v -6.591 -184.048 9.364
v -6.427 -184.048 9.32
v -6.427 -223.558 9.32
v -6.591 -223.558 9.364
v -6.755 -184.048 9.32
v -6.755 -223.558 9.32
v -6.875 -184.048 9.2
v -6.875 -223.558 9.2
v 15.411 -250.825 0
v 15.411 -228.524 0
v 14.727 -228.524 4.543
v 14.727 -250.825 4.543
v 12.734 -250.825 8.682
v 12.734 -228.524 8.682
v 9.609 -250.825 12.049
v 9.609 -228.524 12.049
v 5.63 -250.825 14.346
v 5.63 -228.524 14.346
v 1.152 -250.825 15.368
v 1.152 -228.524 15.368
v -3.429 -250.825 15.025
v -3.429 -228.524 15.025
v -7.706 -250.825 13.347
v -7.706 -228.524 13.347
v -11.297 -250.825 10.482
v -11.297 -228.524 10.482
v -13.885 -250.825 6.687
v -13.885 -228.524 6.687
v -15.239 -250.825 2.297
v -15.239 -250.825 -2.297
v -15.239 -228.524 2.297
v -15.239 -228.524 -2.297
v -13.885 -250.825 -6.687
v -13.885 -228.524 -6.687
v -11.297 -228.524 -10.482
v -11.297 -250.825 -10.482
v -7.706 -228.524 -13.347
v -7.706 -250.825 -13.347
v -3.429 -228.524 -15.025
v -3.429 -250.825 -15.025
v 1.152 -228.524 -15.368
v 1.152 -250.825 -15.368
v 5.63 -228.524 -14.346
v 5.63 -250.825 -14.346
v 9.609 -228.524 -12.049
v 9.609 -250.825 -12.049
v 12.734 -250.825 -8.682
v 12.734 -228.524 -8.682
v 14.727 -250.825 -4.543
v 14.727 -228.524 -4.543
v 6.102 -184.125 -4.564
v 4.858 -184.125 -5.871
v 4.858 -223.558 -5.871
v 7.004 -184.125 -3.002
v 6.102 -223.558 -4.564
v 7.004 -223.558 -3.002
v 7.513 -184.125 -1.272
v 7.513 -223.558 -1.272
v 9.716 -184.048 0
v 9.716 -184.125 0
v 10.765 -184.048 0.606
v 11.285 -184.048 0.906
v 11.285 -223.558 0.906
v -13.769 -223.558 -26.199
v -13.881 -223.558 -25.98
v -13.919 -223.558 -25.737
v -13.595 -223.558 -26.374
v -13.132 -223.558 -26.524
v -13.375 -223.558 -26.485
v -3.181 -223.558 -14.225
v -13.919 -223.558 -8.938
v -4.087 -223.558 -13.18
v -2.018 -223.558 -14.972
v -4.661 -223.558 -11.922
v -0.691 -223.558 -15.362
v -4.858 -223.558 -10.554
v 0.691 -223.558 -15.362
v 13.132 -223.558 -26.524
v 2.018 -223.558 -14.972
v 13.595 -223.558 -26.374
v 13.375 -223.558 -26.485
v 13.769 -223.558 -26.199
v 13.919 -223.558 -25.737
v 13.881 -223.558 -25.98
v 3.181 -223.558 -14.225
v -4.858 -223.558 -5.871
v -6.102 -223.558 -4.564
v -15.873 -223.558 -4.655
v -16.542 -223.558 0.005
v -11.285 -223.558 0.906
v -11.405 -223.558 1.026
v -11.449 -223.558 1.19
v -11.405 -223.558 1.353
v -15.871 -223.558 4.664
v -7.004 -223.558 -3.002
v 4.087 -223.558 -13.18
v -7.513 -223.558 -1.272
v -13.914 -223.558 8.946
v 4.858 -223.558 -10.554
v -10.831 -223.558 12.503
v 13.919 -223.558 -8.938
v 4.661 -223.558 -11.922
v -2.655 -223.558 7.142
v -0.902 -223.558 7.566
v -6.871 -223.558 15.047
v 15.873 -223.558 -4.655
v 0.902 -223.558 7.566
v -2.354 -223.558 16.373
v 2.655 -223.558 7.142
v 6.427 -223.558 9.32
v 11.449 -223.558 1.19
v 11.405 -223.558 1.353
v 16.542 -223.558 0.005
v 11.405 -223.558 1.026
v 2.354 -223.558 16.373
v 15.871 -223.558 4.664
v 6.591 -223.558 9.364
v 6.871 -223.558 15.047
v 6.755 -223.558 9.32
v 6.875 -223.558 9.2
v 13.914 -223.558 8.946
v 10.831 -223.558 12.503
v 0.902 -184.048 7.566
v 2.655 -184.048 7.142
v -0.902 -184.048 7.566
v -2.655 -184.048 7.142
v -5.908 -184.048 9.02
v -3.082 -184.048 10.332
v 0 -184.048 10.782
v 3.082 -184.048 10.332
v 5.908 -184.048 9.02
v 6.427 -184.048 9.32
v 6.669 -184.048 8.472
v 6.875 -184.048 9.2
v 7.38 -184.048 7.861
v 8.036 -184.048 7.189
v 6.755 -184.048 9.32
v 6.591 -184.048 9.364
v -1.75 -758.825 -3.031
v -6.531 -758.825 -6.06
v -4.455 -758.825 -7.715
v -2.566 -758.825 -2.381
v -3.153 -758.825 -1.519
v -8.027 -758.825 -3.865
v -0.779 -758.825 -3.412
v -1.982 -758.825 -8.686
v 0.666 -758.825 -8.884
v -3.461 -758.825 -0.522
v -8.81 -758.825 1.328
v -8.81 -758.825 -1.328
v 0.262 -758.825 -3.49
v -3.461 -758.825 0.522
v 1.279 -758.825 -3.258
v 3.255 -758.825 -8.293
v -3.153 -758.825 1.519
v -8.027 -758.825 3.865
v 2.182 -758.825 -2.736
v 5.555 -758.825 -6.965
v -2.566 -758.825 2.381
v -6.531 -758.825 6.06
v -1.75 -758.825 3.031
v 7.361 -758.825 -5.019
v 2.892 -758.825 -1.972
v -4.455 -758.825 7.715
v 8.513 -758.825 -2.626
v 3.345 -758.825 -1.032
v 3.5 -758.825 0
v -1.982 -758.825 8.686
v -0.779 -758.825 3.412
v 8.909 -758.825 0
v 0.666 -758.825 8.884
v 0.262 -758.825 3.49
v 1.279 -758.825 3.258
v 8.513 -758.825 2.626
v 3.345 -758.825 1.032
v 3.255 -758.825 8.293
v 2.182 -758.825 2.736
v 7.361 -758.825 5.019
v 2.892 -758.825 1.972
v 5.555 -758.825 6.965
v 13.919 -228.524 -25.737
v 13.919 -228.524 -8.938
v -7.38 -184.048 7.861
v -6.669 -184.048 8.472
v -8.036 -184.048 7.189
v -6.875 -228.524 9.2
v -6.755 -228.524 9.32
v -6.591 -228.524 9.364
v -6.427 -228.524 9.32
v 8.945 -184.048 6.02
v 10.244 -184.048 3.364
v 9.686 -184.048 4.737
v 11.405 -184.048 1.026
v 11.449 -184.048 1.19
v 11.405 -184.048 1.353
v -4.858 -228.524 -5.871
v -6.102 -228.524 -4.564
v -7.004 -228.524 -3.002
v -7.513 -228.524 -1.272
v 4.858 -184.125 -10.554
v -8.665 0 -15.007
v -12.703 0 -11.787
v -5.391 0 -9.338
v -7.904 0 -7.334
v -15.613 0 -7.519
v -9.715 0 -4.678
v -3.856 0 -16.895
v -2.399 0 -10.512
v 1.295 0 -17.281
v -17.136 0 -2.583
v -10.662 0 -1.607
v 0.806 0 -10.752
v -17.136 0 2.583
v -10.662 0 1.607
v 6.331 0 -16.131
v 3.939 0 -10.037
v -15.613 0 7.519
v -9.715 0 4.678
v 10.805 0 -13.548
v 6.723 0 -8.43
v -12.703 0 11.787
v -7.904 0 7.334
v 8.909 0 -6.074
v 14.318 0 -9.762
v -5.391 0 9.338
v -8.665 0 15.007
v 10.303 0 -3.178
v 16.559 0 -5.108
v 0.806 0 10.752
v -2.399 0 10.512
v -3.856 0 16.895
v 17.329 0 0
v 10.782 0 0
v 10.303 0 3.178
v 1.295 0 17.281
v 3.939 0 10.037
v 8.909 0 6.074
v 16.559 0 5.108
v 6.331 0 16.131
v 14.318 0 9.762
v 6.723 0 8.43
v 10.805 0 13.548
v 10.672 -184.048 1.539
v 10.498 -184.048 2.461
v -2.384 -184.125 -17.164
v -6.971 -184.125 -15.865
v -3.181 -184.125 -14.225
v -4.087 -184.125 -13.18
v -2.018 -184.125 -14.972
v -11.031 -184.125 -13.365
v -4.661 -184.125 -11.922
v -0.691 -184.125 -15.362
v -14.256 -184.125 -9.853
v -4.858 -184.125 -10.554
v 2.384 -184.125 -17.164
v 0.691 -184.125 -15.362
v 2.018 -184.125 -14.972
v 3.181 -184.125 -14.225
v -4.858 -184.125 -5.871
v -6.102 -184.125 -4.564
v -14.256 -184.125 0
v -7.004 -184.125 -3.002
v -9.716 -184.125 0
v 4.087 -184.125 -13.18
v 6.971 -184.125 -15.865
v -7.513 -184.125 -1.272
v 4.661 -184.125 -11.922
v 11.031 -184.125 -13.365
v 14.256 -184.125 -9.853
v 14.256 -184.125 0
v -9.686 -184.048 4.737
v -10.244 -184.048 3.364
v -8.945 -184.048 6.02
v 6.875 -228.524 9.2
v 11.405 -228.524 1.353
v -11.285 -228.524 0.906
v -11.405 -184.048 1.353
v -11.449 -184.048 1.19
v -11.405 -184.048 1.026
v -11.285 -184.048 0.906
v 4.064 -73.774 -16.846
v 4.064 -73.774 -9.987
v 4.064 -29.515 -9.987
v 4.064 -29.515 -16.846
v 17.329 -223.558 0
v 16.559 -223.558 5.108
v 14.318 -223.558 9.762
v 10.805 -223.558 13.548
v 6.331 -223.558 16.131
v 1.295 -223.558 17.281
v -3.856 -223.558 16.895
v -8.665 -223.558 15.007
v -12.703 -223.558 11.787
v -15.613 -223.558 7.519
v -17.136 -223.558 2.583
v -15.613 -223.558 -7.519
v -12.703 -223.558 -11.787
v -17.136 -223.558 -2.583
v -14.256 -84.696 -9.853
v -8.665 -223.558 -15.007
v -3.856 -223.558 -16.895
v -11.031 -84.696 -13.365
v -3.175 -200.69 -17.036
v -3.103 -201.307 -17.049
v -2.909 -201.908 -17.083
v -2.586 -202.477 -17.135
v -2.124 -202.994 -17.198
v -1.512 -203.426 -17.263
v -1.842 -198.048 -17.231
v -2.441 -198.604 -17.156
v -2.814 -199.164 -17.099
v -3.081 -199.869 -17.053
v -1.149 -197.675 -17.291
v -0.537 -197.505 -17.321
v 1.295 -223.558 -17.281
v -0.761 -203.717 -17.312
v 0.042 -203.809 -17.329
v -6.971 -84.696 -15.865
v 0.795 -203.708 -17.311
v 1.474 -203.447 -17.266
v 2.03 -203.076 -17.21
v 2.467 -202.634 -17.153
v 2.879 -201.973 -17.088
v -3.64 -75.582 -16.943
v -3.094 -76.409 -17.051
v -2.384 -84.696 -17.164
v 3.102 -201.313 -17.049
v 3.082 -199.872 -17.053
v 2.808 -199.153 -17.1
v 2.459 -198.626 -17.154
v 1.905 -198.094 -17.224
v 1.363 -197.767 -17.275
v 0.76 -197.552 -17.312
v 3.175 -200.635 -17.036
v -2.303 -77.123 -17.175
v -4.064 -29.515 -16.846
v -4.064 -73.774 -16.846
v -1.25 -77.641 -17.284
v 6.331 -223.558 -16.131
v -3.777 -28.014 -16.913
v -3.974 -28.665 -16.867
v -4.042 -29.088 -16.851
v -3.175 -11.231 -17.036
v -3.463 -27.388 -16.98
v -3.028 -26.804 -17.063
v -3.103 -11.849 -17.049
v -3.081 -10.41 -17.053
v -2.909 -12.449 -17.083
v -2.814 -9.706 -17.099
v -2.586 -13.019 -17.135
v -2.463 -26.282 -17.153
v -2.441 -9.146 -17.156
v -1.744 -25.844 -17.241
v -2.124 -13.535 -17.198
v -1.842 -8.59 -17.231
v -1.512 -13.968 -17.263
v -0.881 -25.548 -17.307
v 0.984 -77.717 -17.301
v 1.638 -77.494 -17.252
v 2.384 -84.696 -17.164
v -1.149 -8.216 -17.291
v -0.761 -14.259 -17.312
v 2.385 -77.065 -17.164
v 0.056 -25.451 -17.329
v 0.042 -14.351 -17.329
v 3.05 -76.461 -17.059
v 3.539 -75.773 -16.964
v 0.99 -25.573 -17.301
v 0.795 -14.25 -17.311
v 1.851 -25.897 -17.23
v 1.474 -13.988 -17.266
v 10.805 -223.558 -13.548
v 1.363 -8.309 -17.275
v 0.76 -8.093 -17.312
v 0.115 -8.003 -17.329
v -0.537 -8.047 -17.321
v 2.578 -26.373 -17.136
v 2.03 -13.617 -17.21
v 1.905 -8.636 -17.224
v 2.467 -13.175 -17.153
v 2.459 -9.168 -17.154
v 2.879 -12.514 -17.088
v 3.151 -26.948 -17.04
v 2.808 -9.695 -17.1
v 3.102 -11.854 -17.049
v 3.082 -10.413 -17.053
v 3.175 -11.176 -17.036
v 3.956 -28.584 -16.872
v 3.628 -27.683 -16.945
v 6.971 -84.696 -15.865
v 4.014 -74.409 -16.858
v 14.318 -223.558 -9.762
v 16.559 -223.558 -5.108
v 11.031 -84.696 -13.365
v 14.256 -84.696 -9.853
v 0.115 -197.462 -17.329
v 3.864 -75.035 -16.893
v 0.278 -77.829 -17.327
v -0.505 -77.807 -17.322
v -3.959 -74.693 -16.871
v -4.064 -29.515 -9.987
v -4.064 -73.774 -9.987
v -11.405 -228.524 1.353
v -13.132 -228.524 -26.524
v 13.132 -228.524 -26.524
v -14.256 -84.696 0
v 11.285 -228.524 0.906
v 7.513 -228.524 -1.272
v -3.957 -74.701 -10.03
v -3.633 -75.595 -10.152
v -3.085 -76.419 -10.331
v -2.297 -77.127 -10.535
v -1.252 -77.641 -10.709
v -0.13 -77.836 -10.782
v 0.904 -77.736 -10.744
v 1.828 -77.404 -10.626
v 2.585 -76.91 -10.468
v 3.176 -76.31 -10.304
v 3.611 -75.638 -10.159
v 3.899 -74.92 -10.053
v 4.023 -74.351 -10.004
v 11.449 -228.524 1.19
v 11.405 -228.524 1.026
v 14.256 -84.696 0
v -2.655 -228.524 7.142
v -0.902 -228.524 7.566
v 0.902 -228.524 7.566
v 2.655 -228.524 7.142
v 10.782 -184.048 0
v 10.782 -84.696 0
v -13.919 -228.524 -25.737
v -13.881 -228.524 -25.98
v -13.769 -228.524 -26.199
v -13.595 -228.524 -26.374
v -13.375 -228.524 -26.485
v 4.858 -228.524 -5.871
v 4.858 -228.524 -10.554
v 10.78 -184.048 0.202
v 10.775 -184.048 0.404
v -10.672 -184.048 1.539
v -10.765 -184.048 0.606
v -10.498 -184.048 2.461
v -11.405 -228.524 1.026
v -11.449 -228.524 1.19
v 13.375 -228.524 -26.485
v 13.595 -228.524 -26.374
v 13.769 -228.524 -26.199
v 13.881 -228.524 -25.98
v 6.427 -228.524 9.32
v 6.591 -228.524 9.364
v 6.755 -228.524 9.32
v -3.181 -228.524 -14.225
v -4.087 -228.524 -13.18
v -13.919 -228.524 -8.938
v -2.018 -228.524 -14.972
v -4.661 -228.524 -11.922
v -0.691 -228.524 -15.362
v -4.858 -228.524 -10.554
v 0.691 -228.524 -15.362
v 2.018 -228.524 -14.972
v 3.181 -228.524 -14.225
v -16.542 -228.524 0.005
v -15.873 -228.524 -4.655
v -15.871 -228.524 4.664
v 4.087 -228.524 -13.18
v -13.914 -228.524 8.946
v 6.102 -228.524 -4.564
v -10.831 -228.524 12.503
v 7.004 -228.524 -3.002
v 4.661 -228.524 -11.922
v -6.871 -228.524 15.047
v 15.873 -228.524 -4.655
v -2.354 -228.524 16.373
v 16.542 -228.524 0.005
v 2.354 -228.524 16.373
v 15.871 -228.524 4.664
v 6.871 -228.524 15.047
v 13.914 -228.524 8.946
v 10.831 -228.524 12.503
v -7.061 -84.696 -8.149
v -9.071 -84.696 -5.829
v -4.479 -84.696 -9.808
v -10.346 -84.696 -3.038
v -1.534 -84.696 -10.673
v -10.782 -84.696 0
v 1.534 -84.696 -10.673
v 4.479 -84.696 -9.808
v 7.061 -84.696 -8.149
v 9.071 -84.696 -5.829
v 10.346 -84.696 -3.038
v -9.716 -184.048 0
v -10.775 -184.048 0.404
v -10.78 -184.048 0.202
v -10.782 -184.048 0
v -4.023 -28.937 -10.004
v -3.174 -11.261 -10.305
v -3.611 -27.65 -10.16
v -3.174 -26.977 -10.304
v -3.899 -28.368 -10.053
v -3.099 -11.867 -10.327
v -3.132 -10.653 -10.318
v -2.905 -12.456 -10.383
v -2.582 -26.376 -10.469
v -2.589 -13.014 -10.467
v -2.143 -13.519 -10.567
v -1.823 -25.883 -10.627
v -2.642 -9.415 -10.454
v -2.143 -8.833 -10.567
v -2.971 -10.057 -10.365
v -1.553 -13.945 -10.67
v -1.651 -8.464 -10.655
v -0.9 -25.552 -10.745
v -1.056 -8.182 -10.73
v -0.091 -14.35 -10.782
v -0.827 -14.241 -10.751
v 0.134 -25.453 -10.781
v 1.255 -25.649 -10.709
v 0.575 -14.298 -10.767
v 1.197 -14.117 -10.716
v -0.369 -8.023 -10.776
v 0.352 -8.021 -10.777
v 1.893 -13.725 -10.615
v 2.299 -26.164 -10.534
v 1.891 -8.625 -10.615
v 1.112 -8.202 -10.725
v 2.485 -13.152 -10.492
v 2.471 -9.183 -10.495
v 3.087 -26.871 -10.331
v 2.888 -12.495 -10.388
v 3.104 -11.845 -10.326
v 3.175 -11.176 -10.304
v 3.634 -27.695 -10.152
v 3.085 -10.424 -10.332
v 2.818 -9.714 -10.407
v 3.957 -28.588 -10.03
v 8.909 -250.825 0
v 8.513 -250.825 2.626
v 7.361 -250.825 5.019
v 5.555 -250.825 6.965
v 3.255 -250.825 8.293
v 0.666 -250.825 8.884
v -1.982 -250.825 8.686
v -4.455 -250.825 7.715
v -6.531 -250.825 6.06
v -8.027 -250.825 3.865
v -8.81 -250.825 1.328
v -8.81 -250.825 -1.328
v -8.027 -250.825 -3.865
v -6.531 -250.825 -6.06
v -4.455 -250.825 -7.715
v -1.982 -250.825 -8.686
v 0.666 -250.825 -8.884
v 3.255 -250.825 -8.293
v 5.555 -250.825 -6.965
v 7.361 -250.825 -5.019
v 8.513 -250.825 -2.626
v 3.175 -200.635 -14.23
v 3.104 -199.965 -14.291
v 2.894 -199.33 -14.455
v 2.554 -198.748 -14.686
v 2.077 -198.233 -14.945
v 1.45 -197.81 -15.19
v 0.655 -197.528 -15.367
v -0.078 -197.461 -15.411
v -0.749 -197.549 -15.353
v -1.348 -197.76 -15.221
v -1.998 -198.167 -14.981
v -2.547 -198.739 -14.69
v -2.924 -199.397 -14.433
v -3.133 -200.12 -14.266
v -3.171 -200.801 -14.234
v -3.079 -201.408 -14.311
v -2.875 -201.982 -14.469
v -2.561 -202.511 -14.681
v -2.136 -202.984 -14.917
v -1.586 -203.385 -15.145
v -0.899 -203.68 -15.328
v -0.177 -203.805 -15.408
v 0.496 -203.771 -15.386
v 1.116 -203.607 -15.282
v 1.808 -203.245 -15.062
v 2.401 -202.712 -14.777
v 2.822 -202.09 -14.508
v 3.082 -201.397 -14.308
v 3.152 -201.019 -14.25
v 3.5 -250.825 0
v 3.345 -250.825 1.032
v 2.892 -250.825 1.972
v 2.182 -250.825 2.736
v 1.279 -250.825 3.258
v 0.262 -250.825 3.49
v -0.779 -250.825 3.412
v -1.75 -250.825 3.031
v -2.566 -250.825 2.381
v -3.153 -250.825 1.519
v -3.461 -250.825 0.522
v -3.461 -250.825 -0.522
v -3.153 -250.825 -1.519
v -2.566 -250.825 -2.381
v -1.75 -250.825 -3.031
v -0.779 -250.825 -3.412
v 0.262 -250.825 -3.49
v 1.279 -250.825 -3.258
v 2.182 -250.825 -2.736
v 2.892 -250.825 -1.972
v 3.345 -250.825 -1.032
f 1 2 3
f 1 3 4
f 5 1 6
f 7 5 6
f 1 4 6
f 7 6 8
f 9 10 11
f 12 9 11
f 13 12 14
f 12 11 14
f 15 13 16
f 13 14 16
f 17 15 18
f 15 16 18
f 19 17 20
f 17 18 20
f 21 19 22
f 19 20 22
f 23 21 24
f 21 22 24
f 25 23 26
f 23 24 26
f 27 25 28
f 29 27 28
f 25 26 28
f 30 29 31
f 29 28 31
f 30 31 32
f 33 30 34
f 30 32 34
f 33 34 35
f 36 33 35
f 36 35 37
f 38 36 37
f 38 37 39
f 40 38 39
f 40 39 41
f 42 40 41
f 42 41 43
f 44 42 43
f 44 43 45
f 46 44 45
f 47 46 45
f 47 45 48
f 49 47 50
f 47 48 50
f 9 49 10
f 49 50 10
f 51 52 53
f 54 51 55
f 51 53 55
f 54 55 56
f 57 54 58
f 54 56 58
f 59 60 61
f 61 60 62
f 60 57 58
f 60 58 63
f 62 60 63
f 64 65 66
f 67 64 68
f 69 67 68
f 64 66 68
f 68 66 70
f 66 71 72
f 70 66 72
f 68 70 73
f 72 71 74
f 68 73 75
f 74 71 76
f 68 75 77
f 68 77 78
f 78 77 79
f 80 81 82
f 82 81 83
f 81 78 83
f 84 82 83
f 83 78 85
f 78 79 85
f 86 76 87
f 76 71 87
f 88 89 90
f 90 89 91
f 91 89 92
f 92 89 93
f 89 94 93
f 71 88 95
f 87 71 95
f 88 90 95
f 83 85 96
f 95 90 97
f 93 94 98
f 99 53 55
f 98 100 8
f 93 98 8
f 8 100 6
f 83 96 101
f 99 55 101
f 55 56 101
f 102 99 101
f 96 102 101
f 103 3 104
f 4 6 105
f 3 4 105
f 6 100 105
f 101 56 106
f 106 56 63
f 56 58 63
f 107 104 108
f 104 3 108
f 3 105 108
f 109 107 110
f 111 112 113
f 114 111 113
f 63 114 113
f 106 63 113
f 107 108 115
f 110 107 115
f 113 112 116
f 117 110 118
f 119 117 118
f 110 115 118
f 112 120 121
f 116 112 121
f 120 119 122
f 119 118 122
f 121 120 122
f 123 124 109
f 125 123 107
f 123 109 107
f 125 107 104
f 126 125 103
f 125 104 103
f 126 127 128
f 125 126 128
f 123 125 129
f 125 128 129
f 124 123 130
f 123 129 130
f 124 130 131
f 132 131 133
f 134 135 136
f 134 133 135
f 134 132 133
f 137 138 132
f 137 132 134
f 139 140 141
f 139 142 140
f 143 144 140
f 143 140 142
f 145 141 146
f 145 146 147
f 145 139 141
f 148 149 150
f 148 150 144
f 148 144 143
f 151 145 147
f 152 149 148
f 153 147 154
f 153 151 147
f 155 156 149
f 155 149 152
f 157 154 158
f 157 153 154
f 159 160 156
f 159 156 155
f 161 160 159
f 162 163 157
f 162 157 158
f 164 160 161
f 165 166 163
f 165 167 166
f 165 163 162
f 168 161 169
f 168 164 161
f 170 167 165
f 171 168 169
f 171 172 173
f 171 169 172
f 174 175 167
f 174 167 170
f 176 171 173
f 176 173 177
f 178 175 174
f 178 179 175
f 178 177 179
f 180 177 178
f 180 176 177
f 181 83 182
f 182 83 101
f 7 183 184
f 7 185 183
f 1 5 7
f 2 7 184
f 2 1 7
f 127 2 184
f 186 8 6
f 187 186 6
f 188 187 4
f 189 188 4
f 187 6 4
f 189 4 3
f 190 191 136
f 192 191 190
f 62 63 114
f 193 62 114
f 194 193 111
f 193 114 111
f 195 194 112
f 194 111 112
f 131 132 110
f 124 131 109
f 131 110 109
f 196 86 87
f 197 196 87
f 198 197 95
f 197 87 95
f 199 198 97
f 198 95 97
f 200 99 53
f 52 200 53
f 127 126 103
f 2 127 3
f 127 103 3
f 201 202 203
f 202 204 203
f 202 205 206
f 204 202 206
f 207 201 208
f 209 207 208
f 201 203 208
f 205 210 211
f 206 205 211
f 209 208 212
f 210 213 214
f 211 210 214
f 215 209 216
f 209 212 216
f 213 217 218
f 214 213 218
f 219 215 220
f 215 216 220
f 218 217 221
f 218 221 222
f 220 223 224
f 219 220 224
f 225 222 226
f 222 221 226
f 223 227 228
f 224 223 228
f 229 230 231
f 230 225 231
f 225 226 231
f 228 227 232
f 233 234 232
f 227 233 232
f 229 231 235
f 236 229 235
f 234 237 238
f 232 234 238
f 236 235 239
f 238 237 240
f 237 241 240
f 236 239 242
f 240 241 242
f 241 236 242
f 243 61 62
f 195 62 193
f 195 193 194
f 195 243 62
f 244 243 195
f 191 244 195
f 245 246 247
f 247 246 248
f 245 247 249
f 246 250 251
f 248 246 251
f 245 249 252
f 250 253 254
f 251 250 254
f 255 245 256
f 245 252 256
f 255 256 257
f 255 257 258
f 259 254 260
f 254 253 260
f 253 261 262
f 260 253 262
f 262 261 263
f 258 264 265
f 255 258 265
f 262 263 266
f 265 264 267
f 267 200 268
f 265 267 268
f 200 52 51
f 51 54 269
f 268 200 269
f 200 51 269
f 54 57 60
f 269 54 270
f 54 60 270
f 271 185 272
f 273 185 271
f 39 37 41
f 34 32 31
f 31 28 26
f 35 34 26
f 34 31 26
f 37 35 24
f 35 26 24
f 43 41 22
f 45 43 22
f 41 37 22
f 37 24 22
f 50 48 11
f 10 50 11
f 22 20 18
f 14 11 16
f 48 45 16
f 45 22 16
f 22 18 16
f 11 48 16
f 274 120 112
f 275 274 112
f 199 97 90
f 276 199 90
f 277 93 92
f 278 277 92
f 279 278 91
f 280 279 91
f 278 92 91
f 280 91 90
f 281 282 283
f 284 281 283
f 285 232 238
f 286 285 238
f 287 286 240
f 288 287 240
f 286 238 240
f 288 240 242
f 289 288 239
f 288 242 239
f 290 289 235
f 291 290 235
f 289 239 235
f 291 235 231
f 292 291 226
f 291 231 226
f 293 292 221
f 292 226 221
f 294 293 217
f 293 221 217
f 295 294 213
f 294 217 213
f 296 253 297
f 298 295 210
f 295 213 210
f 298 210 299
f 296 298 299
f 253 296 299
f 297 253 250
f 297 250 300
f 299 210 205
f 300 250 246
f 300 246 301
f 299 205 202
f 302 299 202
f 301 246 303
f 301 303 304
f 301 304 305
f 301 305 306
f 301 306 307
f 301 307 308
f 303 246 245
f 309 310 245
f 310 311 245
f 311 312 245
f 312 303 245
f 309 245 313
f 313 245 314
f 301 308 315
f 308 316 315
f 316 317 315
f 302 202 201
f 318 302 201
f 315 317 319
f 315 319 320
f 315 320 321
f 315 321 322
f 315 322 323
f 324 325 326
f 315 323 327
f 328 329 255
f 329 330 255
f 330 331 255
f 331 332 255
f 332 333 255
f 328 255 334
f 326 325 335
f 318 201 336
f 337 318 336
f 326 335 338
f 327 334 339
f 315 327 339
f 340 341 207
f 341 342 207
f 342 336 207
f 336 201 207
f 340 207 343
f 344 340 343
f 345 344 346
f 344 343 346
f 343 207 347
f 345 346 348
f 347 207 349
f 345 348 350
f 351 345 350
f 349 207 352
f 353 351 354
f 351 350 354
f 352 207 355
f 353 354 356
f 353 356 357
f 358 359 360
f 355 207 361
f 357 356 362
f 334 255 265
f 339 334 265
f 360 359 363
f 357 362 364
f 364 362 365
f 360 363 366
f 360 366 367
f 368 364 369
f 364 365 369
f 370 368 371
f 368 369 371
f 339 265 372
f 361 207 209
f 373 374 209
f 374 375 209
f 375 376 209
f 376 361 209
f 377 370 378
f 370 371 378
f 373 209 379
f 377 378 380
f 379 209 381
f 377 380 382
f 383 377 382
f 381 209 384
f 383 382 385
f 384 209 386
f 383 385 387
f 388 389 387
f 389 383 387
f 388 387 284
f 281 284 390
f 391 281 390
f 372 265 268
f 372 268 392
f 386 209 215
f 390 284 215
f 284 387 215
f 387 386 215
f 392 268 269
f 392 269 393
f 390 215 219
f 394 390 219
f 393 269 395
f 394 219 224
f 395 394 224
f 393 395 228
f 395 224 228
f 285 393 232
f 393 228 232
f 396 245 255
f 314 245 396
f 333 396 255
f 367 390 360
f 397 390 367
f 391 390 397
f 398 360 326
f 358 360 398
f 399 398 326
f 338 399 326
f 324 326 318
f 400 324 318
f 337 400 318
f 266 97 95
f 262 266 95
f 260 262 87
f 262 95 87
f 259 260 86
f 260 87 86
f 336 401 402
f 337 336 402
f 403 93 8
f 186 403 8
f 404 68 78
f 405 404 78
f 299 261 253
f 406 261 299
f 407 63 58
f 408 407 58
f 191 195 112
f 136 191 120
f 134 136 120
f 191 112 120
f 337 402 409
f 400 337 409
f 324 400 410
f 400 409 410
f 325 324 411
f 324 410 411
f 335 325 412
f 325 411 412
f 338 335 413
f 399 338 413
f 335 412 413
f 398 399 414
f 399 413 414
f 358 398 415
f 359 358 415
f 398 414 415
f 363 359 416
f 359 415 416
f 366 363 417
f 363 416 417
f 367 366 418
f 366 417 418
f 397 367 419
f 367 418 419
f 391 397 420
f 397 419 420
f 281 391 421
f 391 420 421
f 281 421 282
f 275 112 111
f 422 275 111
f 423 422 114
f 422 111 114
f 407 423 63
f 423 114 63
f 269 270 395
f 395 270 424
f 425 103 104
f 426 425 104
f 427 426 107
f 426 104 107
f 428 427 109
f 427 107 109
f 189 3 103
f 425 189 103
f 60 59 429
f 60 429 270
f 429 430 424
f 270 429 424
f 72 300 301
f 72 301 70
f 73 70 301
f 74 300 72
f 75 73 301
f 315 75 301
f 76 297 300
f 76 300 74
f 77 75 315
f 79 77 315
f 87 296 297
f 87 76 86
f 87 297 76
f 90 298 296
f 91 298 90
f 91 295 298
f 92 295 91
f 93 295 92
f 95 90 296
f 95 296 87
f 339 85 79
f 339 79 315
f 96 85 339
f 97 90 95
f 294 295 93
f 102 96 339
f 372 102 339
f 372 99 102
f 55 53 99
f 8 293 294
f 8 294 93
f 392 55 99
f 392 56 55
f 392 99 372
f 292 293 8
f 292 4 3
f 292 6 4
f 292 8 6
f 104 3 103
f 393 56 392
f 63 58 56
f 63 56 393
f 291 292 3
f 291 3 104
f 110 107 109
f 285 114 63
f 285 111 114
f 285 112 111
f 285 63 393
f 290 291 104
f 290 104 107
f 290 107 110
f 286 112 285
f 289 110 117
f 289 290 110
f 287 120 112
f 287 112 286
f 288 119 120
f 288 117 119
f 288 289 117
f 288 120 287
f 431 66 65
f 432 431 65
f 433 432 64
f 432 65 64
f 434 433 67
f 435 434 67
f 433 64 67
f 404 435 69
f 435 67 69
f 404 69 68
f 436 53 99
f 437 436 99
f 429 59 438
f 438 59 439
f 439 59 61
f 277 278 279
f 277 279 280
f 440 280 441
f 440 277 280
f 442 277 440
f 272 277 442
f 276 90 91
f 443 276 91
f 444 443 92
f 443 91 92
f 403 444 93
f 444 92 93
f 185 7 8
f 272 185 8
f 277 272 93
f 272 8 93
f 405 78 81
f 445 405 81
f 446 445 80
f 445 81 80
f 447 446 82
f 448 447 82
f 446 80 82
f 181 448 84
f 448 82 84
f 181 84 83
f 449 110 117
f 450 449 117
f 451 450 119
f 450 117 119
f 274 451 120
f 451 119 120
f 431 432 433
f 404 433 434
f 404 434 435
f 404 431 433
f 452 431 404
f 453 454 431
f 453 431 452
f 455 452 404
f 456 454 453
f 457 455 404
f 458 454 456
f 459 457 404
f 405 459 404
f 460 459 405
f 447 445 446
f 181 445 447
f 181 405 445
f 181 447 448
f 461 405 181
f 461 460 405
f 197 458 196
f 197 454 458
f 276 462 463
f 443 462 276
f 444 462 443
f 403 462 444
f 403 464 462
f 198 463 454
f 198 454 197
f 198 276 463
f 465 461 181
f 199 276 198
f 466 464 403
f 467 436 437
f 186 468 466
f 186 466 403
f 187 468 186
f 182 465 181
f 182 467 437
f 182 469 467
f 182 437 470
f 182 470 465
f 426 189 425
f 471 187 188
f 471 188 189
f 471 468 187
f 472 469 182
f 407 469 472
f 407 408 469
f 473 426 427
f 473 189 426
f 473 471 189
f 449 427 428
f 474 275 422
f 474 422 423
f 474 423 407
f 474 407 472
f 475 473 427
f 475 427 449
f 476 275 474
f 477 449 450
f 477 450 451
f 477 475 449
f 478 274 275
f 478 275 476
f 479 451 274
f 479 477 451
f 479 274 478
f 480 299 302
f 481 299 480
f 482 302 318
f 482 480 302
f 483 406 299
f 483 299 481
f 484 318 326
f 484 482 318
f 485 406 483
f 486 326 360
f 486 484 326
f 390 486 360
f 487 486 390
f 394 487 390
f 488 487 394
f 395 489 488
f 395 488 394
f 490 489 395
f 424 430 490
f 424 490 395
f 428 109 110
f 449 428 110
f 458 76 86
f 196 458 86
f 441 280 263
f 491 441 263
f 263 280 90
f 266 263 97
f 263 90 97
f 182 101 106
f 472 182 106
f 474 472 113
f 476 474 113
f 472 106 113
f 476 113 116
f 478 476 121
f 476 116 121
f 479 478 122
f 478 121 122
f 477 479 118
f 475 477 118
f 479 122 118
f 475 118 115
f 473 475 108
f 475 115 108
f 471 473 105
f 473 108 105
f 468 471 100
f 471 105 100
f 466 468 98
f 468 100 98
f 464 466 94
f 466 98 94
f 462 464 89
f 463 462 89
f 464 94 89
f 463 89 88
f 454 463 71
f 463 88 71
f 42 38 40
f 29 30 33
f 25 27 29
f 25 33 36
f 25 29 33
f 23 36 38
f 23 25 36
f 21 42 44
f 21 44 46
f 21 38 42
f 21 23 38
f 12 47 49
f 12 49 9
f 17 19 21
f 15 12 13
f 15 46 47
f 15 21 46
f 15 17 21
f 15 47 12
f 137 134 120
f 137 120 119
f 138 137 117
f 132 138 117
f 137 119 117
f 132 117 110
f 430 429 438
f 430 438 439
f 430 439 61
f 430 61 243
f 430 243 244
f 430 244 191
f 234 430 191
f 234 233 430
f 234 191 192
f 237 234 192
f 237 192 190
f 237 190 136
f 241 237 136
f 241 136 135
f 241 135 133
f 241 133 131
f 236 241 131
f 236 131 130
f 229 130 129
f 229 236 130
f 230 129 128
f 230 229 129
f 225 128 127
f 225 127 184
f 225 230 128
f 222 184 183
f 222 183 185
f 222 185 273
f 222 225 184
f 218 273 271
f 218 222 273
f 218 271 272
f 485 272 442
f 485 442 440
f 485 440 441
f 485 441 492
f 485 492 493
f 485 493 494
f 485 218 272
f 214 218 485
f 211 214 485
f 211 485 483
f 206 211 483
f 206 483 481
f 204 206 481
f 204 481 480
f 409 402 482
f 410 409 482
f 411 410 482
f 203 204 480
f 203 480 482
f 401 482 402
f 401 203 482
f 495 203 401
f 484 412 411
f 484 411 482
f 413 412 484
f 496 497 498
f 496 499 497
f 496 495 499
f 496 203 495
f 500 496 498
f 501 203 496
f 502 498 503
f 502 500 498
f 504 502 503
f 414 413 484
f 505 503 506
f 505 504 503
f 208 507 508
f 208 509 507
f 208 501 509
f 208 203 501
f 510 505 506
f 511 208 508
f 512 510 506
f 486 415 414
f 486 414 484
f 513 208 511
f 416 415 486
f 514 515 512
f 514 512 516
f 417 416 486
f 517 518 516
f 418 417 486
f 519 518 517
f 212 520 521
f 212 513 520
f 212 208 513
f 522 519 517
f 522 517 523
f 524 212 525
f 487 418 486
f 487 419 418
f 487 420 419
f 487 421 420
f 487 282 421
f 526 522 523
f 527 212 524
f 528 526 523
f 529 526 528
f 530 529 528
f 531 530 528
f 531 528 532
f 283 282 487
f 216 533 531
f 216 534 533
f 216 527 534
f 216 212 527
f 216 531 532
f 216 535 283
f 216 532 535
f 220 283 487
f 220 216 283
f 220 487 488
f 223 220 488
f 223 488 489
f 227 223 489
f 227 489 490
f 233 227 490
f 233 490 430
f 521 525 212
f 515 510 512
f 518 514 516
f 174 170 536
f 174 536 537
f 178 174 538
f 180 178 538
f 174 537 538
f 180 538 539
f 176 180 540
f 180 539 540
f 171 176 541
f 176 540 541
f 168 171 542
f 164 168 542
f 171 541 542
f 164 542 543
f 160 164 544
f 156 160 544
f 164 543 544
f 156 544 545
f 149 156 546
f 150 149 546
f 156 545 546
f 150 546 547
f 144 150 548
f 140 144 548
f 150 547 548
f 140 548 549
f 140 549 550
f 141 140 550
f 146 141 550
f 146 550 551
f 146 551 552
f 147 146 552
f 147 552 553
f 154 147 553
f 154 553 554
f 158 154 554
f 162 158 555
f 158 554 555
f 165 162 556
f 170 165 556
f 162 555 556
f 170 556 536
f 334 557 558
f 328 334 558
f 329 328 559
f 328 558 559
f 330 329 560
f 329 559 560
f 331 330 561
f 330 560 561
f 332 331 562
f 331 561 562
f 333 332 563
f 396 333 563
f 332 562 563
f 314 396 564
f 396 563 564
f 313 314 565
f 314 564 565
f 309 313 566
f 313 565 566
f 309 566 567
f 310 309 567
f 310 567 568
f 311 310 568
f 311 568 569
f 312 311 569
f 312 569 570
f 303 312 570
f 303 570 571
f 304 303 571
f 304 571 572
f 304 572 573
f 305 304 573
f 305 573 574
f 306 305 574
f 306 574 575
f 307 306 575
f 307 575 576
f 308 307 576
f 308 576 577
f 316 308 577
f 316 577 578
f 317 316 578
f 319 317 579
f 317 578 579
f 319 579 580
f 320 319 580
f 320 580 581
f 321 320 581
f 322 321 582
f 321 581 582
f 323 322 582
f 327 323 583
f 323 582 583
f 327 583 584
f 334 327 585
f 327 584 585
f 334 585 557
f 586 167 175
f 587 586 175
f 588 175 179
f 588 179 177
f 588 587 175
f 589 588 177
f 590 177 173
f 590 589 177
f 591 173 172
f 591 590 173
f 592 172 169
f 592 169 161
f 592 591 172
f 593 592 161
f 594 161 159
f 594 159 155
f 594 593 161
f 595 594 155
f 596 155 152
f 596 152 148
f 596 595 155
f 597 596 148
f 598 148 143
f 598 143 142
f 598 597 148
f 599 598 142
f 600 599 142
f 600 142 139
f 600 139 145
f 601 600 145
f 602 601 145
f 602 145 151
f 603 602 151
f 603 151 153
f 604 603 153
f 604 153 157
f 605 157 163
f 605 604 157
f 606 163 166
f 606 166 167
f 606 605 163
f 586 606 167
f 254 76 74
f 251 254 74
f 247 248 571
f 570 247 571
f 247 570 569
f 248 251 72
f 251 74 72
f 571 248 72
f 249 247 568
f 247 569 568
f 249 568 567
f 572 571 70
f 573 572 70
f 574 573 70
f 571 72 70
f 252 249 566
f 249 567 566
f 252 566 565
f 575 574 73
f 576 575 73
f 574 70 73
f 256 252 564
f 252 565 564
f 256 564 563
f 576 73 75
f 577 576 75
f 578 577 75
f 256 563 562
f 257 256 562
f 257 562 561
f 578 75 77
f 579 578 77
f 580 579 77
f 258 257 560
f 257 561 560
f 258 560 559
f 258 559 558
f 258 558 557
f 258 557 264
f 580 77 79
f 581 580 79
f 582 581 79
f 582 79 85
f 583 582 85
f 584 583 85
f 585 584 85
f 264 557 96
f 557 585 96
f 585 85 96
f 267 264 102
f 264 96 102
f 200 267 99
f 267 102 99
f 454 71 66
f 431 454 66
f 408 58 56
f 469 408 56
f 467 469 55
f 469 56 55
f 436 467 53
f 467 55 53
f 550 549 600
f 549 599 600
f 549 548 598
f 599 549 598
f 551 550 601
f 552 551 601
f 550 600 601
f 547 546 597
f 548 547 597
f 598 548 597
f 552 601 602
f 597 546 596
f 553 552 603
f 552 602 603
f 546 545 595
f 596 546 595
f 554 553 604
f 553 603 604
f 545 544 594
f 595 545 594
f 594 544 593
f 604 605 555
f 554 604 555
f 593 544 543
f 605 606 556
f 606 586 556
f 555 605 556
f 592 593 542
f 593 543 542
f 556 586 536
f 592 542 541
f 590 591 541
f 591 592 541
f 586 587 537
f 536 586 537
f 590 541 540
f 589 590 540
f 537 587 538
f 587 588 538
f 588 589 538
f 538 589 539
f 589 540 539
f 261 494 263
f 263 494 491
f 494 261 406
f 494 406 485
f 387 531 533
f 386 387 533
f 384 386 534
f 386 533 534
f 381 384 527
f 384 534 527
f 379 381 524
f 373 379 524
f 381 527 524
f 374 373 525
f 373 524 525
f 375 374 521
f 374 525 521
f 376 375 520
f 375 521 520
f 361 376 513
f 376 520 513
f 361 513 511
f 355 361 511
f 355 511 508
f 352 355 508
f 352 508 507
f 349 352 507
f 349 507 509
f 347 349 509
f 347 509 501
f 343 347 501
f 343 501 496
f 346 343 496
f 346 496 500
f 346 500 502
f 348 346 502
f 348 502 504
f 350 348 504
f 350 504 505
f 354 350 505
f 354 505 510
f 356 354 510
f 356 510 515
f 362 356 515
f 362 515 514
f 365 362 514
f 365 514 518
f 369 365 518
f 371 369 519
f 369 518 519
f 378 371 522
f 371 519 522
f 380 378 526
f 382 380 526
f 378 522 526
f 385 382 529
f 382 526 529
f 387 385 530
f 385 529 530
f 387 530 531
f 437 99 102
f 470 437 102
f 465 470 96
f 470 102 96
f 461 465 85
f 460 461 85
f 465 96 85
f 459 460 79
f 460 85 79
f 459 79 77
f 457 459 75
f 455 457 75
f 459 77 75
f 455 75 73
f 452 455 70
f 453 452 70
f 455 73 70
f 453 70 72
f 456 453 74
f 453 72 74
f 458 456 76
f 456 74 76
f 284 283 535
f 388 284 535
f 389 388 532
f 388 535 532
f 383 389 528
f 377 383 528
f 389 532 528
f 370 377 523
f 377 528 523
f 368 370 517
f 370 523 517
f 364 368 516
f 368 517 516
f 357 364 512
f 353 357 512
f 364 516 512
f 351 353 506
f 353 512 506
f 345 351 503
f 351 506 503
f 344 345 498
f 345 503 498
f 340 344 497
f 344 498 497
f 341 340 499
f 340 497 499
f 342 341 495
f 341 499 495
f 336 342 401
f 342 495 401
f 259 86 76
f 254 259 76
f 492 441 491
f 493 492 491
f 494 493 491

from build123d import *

# Parameters (mm, degrees)
F0_R      = 17.32915
F0_R_2    = 10.7823
F1_DEPTH  = 184.0484
F2_R      = 17.32915
F3_DEPTH  = 39.5097
F5_DEPTH  = 39.5097
F7_DEPTH  = 4.9657
F8_R      = 15.41145
F9_DEPTH  = 22.3012
F10_R     = 8.90905
F10_R_2   = 3.5
F11_DEPTH = 508
F12_W     = 28.5115
F12_H     = 99.4283
F13_DEPTH = 25.4
F14_R     = 3.175
F15_DEPTH = 25.4


with BuildPart() as f1:
    # F0 (on Front) → F1 (new body)
    with BuildSketch(Plane.XZ):
        Circle(F0_R)
        Circle(F0_R_2, mode=Mode.SUBTRACT)
    extrude(amount=F1_DEPTH)

    # F2 (on face) → F3 (join)
    with BuildSketch(Plane.XZ.offset(184.0484)):
        Circle(F2_R)
    extrude(amount=F3_DEPTH)

    # F4 (on face) → F5 (cut, through all)
    with BuildSketch(Plane.XZ.offset(223.5581)):
        with BuildLine():
            Line((6.427496, 9.320163), (2.655414, 7.142351))
            ThreePointArc((2.655414, 7.142351), (0, 7.62), (-2.655414, 7.142351))
            Line((-2.655414, 7.142351), (-6.427496, 9.320163))
            ThreePointArc((-6.427496, 9.320163), (-6.675815, 9.352855), (-6.874519, 9.200383))
            Line((-6.874519, 9.200383), (-11.405025, 1.353317))
            ThreePointArc((-11.405025, 1.353317), (-11.437717, 1.104998), (-11.285246, 0.906293))
            Line((-11.285246, 0.906293), (-7.513164, -1.271519))
            ThreePointArc((-7.513164, -1.271519), (-6.599114, -3.81), (-4.85775, -5.870832))
            Line((-4.85775, -5.870832), (-4.85775, -10.5537))
            ThreePointArc((-4.85775, -10.5537), (0, -15.41145), (4.85775, -10.5537))
            Line((4.85775, -10.5537), (4.85775, -5.870832))
            ThreePointArc((4.85775, -5.870832), (6.599114, -3.81), (7.513164, -1.271519))
            Line((7.513164, -1.271519), (11.285246, 0.906293))
            ThreePointArc((11.285246, 0.906293), (11.437717, 1.104998), (11.405025, 1.353317))
            Line((11.405025, 1.353317), (6.874519, 9.200383))
            ThreePointArc((6.874519, 9.200383), (6.675815, 9.352855), (6.427496, 9.320163))
        make_face()
    extrude(amount=-F5_DEPTH, mode=Mode.SUBTRACT)

    # F12 (on Top) → F13 (cut)
    with BuildSketch(Plane.XY):
        with Locations((0, -134.41045)):
            Rectangle(F12_W, F12_H)
    extrude(amount=-F13_DEPTH, mode=Mode.SUBTRACT)

    # F14 (on Top) → F15 (cut)
    with BuildSketch(Plane.XY):
        with BuildLine():
            ThreePointArc((4.064, -29.5148), (0, -25.4508), (-4.064, -29.5148))
            Line((-4.064, -29.5148), (-4.064, -73.7743))
            ThreePointArc((-4.064, -73.7743), (0, -77.8383), (4.064, -73.7743))
            Line((4.064, -73.7743), (4.064, -29.5148))
        make_face()
        with Locations((0, -11.176)):
            Circle(F14_R)
        with Locations((0, -200.6346)):
            Circle(F14_R)
    extrude(amount=-F15_DEPTH, mode=Mode.SUBTRACT)


with BuildPart() as f7:
    # F6 (on face) → F7 (new body)
    with BuildSketch(Plane.XZ.offset(223.5581)):
        with BuildLine():
            Line((13.9192, -25.73655), (13.9192, -8.937861))
            ThreePointArc((13.9192, -8.937861), (0, 16.54175), (-13.9192, -8.937861))
            Line((-13.9192, -8.937861), (-13.9192, -25.73655))
            ThreePointArc((-13.9192, -25.73655), (-13.688576, -26.293326), (-13.1318, -26.52395))
            Line((-13.1318, -26.52395), (13.1318, -26.52395))
            ThreePointArc((13.1318, -26.52395), (13.688576, -26.293326), (13.9192, -25.73655))
        make_face()
        with BuildLine():
            ThreePointArc((-4.85775, -5.870832), (-6.599114, -3.81), (-7.513164, -1.271519))
            Line((-7.513164, -1.271519), (-11.285246, 0.906293))
            ThreePointArc((-11.285246, 0.906293), (-11.437717, 1.104998), (-11.405025, 1.353317))
            Line((-11.405025, 1.353317), (-6.874519, 9.200383))
            ThreePointArc((-6.874519, 9.200383), (-6.675815, 9.352855), (-6.427496, 9.320163))
            Line((-6.427496, 9.320163), (-2.655414, 7.142351))
            ThreePointArc((-2.655414, 7.142351), (0, 7.62), (2.655414, 7.142351))
            Line((2.655414, 7.142351), (6.427496, 9.320163))
            ThreePointArc((6.427496, 9.320163), (6.675815, 9.352855), (6.874519, 9.200383))
            Line((6.874519, 9.200383), (11.405025, 1.353317))
            ThreePointArc((11.405025, 1.353317), (11.437717, 1.104998), (11.285246, 0.906293))
            Line((11.285246, 0.906293), (7.513164, -1.271519))
            ThreePointArc((7.513164, -1.271519), (6.599114, -3.81), (4.85775, -5.870832))
            Line((4.85775, -5.870832), (4.85775, -10.5537))
            ThreePointArc((4.85775, -10.5537), (0, -15.41145), (-4.85775, -10.5537))
            Line((-4.85775, -10.5537), (-4.85775, -5.870832))
        make_face(mode=Mode.SUBTRACT)
    extrude(amount=F7_DEPTH)


with BuildPart() as f9:
    # F8 (on face) → F9 (new body)
    with BuildSketch(Plane.XZ.offset(228.5238)):
        Circle(F8_R)
    extrude(amount=F9_DEPTH)


with BuildPart() as f11:
    # F10 (on face) → F11 (new body)
    with BuildSketch(Plane.XZ.offset(250.825)):
        Circle(F10_R)
        Circle(F10_R_2, mode=Mode.SUBTRACT)
    extrude(amount=F11_DEPTH)


solid = Compound([f1.part, f7.part, f9.part, f11.part])
